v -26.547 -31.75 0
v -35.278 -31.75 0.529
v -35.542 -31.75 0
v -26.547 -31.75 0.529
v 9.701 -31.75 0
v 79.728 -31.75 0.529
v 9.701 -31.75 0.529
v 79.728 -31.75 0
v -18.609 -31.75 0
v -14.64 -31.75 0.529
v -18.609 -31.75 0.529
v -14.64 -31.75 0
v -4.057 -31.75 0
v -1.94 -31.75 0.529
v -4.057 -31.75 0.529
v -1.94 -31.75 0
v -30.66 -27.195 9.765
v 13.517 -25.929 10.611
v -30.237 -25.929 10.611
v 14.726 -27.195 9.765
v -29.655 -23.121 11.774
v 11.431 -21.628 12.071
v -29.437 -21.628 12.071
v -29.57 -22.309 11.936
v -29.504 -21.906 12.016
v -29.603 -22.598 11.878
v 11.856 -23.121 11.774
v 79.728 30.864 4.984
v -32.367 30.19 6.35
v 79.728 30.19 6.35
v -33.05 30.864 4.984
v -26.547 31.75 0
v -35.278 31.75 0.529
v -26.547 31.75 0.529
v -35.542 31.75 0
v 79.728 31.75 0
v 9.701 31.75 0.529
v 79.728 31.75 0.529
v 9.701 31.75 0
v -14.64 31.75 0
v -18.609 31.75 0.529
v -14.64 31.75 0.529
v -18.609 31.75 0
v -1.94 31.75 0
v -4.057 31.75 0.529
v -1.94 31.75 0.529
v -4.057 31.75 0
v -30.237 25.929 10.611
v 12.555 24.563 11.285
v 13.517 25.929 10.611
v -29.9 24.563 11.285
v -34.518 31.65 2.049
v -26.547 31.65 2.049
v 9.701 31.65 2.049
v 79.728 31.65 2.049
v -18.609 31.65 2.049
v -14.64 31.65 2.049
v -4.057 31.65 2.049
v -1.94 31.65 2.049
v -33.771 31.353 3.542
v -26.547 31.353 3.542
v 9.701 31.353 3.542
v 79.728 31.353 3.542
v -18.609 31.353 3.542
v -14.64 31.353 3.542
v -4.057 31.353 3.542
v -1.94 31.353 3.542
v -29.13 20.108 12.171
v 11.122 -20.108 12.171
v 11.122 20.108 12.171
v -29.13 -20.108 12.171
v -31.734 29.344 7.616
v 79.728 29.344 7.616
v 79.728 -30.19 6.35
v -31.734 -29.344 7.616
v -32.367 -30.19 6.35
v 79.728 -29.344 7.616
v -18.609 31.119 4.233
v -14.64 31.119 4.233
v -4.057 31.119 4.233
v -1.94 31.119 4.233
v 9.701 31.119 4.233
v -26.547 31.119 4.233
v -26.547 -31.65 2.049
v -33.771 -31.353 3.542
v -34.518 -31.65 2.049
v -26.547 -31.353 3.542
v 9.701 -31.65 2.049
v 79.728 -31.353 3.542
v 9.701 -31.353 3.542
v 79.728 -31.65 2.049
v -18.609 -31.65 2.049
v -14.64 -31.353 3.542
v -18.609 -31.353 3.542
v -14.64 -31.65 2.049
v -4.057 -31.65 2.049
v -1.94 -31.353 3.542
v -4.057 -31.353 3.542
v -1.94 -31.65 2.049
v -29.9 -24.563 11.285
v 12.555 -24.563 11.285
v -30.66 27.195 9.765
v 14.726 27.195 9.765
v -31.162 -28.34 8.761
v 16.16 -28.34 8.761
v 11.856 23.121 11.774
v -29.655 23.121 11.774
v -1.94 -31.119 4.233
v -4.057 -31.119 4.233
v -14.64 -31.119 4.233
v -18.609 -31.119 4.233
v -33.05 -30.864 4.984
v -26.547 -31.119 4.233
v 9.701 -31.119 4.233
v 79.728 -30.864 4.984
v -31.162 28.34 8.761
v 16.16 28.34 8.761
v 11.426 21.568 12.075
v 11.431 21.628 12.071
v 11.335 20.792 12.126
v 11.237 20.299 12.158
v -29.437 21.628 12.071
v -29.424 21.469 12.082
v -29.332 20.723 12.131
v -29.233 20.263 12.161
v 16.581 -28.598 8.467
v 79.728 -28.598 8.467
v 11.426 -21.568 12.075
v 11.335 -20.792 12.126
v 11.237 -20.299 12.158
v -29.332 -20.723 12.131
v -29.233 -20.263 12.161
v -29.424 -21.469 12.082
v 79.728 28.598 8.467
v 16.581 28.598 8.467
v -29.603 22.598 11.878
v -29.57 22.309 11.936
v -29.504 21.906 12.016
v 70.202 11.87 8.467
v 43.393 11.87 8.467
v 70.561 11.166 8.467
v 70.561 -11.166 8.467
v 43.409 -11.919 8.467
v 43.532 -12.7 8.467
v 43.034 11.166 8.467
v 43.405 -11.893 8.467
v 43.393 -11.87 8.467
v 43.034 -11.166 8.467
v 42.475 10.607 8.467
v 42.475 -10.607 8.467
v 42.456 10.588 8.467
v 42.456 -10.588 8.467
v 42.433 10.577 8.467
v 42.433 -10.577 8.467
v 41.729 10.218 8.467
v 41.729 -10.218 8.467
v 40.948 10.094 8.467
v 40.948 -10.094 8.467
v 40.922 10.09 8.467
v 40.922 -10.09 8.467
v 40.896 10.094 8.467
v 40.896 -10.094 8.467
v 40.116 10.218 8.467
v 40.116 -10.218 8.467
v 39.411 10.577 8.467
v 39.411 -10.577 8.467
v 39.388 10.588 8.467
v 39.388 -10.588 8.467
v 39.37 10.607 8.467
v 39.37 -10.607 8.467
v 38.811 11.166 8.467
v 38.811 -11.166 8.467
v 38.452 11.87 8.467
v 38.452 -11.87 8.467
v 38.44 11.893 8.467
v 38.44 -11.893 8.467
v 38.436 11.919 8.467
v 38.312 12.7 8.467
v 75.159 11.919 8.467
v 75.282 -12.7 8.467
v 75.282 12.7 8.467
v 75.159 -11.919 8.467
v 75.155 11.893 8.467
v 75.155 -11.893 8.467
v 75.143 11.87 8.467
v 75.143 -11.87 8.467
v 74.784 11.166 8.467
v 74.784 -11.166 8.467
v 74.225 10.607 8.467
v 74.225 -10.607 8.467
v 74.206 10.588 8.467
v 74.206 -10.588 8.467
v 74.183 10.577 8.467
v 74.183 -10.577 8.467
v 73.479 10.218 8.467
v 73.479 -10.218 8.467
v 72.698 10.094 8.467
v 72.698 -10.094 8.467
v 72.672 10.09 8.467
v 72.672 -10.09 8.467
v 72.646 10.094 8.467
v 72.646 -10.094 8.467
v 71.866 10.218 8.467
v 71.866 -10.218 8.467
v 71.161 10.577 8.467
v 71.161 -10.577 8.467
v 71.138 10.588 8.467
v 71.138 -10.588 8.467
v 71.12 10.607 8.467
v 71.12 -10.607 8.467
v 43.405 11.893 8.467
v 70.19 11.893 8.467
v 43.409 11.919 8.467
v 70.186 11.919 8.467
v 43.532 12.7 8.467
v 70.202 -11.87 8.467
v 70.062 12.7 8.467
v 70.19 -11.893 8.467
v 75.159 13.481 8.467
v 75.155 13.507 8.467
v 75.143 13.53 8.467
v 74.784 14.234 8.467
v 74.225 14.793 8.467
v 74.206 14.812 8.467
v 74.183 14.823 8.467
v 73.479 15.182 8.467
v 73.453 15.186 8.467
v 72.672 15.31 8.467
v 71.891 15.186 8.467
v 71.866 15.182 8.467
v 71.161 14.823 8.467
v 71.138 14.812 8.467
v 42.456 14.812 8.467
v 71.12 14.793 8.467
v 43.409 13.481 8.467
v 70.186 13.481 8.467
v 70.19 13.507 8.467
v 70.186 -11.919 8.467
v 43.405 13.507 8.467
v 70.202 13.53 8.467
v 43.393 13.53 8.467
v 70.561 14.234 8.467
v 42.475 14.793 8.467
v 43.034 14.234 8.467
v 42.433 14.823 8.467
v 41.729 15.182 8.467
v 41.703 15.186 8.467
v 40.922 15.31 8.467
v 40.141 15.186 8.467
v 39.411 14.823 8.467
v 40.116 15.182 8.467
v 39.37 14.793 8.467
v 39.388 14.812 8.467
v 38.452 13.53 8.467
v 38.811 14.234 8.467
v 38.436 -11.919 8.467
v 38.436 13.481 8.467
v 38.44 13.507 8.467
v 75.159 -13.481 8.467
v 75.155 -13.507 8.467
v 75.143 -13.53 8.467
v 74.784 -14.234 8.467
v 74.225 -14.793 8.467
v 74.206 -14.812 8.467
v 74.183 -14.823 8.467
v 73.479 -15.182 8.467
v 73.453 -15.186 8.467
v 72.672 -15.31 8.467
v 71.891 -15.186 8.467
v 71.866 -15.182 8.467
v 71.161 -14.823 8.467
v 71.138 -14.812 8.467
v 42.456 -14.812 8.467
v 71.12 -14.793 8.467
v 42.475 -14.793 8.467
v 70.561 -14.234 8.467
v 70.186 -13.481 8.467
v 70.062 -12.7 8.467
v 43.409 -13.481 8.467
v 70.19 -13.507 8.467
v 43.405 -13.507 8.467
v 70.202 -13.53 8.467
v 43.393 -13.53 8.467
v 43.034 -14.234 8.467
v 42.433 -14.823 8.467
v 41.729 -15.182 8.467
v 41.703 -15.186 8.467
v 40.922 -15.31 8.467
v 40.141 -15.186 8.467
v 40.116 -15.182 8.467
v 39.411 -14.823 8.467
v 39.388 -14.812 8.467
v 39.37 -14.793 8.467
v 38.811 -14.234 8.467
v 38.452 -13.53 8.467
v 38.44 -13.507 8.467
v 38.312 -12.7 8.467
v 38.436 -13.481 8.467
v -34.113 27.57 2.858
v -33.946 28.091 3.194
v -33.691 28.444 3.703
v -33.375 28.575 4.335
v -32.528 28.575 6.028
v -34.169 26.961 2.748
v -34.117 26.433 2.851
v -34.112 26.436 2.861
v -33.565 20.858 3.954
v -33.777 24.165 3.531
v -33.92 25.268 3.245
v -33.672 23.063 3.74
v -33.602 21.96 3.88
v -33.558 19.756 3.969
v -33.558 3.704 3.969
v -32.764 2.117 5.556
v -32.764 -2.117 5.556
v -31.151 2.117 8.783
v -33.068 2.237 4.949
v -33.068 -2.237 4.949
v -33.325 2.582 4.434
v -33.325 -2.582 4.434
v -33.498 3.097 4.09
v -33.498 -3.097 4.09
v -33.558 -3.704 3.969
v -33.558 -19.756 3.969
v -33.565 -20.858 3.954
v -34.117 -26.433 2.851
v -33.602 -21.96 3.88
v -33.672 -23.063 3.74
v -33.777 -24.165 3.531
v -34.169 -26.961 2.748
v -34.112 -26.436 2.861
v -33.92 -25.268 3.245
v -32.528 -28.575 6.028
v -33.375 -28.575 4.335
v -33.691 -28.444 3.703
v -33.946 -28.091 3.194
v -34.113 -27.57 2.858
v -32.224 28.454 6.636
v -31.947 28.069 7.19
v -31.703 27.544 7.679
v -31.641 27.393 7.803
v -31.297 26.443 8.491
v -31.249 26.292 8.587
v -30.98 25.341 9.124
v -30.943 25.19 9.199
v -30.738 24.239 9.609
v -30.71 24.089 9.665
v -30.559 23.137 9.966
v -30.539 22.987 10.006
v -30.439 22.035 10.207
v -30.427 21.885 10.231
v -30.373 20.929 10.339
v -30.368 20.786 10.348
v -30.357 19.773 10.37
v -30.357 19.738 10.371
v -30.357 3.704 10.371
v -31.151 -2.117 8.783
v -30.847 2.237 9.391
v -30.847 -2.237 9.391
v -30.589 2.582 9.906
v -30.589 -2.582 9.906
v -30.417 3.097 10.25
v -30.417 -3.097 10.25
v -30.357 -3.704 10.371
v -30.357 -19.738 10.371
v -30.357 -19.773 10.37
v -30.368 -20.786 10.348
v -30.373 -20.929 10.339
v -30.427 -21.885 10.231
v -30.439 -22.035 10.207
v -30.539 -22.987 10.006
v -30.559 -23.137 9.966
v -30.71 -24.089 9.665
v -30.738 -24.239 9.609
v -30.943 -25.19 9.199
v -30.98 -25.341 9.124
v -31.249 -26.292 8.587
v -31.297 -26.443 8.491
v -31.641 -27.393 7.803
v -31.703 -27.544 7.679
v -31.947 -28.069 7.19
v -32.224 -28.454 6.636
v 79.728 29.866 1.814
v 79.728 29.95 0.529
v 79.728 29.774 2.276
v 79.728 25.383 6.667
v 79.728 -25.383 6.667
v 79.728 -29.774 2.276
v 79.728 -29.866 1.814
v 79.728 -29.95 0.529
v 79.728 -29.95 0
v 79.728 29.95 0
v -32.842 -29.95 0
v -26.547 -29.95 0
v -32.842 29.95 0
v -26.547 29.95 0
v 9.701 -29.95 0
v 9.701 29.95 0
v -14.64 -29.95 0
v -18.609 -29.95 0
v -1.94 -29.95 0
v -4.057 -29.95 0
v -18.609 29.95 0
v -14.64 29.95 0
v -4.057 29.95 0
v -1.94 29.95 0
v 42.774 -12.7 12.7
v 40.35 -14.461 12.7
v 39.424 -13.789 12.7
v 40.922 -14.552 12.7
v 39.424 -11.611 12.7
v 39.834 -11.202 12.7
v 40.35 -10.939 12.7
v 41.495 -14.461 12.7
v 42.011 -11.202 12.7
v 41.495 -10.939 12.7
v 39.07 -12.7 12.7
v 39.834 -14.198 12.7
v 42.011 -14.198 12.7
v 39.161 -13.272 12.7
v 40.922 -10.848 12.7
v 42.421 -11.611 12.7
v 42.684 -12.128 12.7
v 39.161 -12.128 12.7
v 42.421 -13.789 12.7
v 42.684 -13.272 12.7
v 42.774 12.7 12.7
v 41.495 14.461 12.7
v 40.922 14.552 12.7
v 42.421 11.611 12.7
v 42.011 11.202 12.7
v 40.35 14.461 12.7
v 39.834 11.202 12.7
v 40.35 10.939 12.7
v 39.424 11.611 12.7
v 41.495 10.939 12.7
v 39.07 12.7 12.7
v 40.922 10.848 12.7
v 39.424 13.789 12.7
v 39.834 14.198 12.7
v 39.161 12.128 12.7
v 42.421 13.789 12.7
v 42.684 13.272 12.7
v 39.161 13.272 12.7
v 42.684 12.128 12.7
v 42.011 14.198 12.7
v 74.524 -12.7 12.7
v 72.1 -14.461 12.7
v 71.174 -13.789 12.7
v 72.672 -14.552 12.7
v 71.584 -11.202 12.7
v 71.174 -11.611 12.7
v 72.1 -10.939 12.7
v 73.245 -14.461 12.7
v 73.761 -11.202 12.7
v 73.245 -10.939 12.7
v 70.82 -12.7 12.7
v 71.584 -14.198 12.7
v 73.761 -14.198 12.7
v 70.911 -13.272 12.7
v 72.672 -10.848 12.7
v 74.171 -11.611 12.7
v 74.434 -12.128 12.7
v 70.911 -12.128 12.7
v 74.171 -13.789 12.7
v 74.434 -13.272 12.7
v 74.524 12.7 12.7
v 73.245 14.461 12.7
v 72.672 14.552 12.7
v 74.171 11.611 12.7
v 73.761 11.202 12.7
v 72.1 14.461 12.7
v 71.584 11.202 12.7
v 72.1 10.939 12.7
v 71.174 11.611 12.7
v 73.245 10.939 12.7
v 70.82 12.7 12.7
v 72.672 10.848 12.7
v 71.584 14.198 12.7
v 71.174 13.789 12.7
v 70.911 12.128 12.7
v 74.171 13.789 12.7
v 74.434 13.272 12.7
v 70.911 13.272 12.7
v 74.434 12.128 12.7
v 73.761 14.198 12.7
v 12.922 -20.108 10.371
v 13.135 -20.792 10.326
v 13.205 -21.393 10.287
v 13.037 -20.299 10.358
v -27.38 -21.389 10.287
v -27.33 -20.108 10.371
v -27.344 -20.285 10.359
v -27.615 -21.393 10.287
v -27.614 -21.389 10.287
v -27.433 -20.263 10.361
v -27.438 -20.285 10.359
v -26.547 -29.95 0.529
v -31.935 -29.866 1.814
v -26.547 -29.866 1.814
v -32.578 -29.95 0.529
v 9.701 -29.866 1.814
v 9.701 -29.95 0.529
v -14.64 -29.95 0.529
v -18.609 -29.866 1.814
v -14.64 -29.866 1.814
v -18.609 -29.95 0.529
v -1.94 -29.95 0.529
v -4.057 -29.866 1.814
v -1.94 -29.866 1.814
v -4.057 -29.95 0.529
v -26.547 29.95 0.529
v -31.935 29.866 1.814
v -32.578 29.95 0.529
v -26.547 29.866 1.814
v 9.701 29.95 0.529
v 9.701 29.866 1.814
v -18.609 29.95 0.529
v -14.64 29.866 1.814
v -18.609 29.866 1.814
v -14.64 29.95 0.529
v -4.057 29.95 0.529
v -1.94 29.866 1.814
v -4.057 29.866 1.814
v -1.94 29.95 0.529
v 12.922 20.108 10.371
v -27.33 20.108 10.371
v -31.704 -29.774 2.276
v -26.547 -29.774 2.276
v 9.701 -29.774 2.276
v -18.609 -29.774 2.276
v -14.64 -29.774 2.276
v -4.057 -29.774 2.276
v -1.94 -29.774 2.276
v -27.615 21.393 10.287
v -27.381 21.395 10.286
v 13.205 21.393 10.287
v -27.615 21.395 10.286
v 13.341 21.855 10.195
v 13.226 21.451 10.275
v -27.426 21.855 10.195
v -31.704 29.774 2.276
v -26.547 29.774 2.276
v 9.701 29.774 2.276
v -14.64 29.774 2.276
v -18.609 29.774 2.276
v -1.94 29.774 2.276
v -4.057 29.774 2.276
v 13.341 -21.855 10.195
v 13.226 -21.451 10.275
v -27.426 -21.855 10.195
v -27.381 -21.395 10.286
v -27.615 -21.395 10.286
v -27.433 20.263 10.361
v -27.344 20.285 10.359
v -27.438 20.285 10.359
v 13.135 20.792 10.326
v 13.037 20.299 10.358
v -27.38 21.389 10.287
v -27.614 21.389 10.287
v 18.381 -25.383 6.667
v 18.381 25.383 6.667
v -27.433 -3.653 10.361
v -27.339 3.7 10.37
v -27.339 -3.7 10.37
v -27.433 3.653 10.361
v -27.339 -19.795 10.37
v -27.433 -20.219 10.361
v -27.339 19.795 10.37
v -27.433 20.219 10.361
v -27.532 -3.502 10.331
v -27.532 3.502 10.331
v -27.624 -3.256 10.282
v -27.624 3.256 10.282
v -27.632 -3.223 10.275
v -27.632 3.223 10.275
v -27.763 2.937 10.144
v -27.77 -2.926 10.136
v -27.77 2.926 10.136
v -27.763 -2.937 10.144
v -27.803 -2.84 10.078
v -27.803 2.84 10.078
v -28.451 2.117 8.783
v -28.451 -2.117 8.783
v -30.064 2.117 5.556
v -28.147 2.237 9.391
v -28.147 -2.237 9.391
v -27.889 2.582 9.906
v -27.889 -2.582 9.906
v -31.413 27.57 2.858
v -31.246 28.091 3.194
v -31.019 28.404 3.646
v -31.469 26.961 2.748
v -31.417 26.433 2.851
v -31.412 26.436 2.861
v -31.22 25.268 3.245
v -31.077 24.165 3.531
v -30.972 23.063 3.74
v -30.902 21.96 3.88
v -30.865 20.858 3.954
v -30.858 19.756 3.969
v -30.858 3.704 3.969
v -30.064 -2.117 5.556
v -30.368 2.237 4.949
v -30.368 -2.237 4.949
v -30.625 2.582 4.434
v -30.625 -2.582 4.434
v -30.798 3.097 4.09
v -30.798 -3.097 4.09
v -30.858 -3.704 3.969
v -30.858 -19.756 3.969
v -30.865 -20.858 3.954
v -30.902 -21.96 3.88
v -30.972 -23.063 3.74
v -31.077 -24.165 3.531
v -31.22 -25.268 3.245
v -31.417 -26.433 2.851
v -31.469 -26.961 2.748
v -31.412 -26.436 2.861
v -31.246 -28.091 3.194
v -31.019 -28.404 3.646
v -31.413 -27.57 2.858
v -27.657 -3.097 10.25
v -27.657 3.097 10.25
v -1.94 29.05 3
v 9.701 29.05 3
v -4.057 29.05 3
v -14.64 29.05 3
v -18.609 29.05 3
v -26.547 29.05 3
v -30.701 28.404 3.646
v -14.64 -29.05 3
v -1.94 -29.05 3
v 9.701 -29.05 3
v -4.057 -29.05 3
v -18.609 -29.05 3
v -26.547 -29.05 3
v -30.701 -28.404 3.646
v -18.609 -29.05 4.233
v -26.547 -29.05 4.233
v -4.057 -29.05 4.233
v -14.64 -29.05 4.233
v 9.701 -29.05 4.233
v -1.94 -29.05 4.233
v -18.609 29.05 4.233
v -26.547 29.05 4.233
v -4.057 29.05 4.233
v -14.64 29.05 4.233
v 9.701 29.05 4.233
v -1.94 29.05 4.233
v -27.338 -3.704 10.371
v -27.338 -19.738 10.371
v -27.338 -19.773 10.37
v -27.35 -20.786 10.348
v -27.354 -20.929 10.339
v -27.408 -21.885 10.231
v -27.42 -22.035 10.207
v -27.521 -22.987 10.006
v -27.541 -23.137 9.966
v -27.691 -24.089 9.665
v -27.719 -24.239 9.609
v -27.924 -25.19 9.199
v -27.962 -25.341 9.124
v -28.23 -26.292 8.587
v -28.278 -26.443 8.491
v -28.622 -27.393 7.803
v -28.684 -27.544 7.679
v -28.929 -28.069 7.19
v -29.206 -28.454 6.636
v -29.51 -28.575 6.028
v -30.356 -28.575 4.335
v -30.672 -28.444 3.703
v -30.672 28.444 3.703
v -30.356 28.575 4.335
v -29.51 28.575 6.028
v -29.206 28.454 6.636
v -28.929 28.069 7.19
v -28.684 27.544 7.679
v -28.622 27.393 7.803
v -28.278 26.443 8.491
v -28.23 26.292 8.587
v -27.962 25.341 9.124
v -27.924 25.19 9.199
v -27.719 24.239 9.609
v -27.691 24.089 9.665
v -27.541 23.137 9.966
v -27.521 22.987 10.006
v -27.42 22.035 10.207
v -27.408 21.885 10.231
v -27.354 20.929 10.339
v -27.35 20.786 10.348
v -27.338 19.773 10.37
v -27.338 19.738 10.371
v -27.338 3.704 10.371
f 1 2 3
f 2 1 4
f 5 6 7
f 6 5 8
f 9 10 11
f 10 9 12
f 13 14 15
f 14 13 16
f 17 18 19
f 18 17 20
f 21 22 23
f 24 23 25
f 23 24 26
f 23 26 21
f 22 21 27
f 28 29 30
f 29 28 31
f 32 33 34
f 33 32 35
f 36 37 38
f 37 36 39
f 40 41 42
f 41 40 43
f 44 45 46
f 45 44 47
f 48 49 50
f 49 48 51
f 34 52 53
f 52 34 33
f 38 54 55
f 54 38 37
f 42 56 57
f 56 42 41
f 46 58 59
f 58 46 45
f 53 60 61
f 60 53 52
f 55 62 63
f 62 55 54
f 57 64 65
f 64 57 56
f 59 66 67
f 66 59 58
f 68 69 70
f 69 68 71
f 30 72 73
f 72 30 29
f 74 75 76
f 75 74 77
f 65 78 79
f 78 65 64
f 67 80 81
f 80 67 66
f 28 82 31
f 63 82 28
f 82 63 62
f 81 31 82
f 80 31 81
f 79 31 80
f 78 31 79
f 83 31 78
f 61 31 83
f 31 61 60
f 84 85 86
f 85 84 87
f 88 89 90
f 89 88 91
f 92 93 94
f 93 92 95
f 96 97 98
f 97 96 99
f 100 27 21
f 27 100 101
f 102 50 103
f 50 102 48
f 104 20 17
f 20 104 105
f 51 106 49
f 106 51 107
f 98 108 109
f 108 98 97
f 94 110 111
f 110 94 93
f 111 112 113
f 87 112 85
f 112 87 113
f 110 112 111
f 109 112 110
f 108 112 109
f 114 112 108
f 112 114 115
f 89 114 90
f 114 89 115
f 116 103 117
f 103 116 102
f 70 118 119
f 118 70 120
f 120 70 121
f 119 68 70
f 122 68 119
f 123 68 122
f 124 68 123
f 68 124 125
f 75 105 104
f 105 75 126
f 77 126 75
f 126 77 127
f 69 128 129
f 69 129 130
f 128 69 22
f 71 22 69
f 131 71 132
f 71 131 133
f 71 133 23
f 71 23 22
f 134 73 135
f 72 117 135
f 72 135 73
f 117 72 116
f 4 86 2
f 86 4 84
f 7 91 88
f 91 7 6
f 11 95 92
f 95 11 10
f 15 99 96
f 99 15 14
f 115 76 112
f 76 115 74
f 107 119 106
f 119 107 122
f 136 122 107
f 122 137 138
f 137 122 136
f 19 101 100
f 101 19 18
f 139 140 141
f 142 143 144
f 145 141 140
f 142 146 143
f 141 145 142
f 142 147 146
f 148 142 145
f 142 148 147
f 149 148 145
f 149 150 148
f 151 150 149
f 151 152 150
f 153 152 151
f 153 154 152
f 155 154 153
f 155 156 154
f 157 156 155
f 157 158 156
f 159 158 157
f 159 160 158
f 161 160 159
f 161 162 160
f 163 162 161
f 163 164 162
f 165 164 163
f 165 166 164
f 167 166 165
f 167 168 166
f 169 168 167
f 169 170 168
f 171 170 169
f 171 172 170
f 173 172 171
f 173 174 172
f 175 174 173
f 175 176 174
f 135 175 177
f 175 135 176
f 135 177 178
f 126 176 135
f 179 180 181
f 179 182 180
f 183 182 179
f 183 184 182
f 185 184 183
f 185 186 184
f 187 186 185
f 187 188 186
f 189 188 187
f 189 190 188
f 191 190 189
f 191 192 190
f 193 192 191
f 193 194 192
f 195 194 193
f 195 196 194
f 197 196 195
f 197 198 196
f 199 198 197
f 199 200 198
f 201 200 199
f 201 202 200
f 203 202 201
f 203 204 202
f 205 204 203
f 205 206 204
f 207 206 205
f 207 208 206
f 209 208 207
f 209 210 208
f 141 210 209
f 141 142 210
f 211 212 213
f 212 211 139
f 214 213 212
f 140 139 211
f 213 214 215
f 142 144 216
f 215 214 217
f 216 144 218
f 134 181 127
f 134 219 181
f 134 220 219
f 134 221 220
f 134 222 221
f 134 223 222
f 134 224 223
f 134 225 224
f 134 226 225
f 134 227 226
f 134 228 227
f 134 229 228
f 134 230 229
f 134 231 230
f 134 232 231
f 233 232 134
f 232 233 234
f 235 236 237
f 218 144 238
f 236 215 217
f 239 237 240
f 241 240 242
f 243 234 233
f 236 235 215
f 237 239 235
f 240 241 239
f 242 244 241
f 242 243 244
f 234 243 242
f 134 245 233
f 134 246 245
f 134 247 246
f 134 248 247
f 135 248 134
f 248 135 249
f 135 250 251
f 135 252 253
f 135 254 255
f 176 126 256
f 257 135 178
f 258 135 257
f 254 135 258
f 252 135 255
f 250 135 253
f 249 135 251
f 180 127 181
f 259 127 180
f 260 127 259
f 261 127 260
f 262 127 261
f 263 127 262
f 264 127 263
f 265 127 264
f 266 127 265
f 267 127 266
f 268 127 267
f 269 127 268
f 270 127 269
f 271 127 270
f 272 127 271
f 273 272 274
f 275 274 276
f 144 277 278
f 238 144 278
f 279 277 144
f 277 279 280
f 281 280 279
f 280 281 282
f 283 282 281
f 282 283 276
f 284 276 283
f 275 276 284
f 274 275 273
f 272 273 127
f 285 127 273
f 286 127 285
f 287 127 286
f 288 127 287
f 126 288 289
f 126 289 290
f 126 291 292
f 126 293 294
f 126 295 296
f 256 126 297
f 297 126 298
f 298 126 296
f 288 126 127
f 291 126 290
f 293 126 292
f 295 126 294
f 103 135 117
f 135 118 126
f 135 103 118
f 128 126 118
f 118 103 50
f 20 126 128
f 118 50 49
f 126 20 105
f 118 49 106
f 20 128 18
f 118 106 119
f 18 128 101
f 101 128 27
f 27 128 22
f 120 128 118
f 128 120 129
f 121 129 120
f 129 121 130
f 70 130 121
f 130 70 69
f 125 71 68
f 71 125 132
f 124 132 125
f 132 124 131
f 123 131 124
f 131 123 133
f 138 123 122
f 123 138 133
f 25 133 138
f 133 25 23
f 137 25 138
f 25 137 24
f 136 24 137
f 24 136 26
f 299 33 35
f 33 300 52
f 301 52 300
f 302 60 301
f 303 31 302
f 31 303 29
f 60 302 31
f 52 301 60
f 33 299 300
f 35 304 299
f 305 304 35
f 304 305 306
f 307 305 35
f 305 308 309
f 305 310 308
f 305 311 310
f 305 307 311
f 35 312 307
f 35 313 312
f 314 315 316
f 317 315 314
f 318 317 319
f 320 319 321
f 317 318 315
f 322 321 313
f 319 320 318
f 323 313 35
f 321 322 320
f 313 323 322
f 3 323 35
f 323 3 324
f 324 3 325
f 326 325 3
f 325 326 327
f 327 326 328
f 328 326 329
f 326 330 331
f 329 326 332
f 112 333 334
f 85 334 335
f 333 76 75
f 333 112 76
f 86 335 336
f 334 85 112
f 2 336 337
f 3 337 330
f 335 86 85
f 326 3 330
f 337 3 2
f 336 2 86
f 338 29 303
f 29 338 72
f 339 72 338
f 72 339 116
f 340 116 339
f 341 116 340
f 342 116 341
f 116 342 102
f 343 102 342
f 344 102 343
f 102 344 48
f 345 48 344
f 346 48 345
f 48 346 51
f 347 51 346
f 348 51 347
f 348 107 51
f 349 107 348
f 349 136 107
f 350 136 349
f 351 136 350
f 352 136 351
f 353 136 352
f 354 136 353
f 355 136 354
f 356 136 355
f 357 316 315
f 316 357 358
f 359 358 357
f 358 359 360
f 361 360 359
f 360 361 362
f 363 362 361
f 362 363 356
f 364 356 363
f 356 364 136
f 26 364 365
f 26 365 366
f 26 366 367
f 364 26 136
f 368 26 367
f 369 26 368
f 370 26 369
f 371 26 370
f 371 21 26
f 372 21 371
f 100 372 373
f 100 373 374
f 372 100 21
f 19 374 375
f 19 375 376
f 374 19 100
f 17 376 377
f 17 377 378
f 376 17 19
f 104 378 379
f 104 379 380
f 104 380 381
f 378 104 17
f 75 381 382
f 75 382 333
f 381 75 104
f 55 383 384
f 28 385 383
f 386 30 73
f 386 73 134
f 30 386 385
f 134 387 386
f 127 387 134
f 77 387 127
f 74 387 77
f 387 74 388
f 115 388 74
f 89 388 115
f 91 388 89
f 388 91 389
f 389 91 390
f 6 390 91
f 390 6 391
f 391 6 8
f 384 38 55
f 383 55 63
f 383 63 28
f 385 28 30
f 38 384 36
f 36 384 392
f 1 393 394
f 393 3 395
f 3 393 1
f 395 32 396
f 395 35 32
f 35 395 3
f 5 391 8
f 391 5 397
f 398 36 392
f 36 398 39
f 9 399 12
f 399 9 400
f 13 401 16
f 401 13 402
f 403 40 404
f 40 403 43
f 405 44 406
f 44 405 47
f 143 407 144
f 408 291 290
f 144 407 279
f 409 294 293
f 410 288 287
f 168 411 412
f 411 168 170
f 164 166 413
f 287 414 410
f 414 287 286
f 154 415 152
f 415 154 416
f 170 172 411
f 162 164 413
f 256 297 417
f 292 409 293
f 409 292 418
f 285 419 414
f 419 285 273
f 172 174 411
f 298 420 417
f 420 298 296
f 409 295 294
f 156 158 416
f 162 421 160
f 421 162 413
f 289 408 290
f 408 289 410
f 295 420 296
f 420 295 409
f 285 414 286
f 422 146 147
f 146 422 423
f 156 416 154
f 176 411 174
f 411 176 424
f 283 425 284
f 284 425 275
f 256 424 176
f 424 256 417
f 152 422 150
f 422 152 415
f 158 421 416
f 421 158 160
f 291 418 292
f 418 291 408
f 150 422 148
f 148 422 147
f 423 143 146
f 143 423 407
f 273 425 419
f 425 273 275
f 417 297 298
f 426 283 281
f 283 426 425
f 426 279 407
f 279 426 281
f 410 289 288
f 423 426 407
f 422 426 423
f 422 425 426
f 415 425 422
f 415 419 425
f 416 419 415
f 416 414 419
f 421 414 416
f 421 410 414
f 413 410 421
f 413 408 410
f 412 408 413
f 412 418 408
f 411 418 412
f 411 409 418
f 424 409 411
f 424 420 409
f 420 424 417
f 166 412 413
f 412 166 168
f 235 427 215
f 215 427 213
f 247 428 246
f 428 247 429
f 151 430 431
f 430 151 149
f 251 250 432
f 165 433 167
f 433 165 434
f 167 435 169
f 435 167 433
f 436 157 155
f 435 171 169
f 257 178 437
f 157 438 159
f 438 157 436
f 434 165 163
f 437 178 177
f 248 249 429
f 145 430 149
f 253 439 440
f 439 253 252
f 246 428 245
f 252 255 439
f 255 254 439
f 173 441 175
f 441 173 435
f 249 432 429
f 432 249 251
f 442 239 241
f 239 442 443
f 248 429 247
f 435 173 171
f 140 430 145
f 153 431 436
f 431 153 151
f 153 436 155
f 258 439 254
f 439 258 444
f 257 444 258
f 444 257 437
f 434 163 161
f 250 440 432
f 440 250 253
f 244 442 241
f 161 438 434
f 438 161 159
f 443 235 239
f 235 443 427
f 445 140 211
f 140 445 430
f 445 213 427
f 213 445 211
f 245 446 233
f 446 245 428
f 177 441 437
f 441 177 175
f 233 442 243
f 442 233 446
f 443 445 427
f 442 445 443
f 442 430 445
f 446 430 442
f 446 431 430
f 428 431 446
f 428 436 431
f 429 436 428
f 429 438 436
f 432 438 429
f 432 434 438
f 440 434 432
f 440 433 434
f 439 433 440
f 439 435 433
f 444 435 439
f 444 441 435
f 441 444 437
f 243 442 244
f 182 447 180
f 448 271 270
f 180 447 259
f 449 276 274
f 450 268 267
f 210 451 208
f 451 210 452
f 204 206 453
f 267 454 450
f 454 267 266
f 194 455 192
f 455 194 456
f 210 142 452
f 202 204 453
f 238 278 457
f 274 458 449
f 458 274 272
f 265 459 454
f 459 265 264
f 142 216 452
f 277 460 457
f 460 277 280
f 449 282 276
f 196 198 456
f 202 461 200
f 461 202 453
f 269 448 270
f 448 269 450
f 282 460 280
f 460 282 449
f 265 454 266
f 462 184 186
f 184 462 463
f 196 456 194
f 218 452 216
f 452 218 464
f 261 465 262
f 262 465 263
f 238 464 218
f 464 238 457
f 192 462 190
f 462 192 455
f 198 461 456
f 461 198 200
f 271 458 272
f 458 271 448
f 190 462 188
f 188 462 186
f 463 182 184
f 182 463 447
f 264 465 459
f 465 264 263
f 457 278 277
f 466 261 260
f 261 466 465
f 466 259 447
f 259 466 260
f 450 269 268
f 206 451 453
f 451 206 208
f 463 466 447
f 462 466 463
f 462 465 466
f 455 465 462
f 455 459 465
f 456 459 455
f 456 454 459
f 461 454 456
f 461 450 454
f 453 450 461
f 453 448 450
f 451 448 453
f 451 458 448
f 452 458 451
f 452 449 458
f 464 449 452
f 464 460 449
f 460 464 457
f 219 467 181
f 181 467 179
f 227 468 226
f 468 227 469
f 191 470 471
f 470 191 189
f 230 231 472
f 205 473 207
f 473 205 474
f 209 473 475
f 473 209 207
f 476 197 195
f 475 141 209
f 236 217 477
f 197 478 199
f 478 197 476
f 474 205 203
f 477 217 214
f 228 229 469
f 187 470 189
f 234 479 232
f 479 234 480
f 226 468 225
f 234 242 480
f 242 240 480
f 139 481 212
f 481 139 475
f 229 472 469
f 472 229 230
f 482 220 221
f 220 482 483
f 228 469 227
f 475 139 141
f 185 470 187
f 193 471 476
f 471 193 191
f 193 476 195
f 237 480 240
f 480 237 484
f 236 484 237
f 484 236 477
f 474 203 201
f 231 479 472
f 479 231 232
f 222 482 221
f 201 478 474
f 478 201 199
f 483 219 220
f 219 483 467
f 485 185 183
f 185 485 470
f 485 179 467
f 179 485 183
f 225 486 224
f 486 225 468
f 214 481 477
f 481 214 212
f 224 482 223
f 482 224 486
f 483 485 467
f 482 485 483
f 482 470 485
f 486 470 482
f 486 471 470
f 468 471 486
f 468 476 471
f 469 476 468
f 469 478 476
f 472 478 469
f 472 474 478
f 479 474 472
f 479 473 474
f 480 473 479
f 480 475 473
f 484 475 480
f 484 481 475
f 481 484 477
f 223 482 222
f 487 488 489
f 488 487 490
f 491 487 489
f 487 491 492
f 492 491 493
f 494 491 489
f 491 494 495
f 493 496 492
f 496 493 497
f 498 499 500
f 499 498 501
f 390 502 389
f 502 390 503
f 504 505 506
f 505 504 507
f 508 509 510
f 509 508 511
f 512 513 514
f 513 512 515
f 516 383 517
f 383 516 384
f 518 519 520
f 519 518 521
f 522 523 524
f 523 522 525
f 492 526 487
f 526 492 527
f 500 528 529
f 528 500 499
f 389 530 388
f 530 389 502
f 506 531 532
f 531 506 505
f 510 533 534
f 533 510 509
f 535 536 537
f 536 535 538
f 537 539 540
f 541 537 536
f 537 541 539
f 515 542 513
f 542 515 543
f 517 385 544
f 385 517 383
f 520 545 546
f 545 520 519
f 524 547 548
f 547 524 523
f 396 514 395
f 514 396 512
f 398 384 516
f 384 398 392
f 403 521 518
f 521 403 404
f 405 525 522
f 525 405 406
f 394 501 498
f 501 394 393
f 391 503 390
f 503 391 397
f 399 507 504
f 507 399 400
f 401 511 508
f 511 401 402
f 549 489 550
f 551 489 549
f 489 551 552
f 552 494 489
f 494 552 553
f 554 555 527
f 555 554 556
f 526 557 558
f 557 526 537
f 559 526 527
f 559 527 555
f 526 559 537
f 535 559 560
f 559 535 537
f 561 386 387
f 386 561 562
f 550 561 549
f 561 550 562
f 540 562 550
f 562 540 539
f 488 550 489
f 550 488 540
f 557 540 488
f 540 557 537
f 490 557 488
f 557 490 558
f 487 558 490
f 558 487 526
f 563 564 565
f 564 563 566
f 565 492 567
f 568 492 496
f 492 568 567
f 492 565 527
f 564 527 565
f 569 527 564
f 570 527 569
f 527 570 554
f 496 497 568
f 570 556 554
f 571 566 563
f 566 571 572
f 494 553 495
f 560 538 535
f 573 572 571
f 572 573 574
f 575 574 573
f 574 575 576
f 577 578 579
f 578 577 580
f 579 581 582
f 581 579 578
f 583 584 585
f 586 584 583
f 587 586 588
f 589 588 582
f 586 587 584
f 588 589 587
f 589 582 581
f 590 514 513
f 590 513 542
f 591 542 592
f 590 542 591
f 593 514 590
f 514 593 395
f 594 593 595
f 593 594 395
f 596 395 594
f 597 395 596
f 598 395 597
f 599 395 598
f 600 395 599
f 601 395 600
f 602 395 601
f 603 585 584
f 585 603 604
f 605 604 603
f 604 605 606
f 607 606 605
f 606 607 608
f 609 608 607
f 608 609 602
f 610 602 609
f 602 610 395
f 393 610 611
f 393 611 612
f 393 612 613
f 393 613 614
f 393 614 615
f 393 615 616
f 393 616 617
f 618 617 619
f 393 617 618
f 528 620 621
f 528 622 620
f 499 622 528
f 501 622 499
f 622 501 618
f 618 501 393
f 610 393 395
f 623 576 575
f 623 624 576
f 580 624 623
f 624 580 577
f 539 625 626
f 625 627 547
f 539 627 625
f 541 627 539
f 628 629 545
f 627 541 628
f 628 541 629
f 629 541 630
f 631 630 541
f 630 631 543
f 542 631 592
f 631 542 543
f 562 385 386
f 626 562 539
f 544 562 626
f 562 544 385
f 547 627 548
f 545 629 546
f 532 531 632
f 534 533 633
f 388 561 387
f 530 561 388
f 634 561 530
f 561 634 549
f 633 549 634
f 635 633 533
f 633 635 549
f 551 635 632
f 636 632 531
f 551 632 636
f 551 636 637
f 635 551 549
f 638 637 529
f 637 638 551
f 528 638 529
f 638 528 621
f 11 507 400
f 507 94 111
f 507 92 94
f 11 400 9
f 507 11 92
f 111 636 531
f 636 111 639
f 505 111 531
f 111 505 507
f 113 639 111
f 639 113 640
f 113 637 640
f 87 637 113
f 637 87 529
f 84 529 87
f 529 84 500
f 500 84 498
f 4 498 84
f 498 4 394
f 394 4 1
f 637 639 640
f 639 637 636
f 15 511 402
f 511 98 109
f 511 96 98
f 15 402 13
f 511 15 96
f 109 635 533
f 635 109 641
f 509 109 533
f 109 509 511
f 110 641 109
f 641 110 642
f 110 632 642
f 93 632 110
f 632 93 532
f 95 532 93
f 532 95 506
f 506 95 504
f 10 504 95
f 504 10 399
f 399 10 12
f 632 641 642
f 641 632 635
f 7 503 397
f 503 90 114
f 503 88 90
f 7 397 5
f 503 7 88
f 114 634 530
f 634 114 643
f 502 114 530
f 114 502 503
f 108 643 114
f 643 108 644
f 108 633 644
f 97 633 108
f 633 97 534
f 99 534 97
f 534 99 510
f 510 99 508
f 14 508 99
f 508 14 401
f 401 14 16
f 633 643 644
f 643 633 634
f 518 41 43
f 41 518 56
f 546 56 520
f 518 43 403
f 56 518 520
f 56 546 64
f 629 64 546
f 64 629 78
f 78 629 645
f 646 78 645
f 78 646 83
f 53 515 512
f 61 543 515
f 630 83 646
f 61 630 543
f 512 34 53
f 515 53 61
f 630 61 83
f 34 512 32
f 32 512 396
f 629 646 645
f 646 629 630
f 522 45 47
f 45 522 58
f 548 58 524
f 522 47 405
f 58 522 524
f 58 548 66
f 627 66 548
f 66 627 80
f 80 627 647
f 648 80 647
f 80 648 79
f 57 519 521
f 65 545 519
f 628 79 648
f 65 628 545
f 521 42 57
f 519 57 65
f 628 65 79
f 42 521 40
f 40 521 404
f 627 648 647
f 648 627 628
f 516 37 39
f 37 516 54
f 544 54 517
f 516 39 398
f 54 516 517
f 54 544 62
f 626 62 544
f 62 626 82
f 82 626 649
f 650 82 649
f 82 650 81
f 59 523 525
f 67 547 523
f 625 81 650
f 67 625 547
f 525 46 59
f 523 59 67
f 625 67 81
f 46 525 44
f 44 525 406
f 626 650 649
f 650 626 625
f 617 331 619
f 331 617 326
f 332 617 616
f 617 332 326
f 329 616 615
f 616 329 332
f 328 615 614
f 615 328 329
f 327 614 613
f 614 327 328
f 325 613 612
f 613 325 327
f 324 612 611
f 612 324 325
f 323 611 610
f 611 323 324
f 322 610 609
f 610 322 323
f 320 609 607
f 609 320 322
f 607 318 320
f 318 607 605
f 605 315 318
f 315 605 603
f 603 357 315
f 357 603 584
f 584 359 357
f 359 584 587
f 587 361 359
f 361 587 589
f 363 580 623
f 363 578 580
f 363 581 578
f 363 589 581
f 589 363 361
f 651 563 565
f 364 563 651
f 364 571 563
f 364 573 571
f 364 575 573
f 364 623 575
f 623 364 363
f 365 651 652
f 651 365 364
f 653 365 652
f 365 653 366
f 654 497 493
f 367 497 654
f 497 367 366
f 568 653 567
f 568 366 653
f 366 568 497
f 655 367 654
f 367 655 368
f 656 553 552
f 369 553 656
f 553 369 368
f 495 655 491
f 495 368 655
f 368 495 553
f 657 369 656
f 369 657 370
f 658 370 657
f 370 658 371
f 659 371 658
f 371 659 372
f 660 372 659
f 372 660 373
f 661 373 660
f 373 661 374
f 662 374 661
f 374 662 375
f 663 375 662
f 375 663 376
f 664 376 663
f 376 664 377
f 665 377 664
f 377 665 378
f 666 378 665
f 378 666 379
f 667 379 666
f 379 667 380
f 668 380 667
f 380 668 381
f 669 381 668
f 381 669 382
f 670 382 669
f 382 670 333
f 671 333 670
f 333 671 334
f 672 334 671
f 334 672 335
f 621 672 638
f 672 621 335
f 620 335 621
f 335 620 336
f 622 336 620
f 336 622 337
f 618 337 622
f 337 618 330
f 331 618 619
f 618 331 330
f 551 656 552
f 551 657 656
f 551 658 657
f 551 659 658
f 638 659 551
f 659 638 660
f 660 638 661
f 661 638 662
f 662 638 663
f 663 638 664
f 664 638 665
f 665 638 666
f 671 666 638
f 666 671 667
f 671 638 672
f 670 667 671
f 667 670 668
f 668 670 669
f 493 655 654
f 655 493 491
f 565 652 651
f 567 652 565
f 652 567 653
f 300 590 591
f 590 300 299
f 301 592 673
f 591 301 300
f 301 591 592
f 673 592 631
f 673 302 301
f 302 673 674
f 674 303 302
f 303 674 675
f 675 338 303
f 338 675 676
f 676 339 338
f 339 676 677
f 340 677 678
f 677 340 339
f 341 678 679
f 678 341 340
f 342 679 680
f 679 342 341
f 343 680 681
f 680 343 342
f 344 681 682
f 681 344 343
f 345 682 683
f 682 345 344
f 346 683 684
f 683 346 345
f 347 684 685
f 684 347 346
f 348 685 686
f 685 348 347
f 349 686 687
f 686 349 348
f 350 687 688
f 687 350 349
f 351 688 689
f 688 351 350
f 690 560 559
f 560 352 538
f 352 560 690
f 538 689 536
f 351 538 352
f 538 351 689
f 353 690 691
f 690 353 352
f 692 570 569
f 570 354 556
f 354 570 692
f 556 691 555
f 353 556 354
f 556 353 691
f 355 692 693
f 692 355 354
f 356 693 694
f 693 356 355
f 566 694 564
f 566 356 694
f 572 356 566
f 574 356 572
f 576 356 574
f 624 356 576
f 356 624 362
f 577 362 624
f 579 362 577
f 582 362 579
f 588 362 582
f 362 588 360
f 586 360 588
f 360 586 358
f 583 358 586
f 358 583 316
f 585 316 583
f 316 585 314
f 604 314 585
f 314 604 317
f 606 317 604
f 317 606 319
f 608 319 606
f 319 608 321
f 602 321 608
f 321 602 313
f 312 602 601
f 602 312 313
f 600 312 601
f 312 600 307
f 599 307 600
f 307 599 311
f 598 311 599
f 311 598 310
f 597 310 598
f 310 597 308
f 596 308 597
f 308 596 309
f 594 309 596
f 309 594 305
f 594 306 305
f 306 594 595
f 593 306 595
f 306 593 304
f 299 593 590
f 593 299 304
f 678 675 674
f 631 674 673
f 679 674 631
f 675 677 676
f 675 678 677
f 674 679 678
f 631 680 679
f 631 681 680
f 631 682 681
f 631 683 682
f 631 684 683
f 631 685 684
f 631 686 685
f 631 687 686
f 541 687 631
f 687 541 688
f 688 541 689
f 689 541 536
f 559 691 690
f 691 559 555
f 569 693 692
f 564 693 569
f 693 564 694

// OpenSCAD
// Milwaukee Road Little Joe, O scale 1-48 - print 4 of 17: roof_1 - roof, section 1 (print upright)
// Render (F6), export STL, print. Settings: ../../library/lj_params.scad
// Whole loco preview and notes: ../../MILW_LittleJoe_Main.scad
SCALE_SEL = "O";
LOCO_SEL = "E70";   // [E20, E21, E70, E71, E72, E73, E74, E75, E76, E77, E78, E79] the body and roof change for E20 / E21
include <../../library/lj_all.scad>
lj_plate("roof_1");
